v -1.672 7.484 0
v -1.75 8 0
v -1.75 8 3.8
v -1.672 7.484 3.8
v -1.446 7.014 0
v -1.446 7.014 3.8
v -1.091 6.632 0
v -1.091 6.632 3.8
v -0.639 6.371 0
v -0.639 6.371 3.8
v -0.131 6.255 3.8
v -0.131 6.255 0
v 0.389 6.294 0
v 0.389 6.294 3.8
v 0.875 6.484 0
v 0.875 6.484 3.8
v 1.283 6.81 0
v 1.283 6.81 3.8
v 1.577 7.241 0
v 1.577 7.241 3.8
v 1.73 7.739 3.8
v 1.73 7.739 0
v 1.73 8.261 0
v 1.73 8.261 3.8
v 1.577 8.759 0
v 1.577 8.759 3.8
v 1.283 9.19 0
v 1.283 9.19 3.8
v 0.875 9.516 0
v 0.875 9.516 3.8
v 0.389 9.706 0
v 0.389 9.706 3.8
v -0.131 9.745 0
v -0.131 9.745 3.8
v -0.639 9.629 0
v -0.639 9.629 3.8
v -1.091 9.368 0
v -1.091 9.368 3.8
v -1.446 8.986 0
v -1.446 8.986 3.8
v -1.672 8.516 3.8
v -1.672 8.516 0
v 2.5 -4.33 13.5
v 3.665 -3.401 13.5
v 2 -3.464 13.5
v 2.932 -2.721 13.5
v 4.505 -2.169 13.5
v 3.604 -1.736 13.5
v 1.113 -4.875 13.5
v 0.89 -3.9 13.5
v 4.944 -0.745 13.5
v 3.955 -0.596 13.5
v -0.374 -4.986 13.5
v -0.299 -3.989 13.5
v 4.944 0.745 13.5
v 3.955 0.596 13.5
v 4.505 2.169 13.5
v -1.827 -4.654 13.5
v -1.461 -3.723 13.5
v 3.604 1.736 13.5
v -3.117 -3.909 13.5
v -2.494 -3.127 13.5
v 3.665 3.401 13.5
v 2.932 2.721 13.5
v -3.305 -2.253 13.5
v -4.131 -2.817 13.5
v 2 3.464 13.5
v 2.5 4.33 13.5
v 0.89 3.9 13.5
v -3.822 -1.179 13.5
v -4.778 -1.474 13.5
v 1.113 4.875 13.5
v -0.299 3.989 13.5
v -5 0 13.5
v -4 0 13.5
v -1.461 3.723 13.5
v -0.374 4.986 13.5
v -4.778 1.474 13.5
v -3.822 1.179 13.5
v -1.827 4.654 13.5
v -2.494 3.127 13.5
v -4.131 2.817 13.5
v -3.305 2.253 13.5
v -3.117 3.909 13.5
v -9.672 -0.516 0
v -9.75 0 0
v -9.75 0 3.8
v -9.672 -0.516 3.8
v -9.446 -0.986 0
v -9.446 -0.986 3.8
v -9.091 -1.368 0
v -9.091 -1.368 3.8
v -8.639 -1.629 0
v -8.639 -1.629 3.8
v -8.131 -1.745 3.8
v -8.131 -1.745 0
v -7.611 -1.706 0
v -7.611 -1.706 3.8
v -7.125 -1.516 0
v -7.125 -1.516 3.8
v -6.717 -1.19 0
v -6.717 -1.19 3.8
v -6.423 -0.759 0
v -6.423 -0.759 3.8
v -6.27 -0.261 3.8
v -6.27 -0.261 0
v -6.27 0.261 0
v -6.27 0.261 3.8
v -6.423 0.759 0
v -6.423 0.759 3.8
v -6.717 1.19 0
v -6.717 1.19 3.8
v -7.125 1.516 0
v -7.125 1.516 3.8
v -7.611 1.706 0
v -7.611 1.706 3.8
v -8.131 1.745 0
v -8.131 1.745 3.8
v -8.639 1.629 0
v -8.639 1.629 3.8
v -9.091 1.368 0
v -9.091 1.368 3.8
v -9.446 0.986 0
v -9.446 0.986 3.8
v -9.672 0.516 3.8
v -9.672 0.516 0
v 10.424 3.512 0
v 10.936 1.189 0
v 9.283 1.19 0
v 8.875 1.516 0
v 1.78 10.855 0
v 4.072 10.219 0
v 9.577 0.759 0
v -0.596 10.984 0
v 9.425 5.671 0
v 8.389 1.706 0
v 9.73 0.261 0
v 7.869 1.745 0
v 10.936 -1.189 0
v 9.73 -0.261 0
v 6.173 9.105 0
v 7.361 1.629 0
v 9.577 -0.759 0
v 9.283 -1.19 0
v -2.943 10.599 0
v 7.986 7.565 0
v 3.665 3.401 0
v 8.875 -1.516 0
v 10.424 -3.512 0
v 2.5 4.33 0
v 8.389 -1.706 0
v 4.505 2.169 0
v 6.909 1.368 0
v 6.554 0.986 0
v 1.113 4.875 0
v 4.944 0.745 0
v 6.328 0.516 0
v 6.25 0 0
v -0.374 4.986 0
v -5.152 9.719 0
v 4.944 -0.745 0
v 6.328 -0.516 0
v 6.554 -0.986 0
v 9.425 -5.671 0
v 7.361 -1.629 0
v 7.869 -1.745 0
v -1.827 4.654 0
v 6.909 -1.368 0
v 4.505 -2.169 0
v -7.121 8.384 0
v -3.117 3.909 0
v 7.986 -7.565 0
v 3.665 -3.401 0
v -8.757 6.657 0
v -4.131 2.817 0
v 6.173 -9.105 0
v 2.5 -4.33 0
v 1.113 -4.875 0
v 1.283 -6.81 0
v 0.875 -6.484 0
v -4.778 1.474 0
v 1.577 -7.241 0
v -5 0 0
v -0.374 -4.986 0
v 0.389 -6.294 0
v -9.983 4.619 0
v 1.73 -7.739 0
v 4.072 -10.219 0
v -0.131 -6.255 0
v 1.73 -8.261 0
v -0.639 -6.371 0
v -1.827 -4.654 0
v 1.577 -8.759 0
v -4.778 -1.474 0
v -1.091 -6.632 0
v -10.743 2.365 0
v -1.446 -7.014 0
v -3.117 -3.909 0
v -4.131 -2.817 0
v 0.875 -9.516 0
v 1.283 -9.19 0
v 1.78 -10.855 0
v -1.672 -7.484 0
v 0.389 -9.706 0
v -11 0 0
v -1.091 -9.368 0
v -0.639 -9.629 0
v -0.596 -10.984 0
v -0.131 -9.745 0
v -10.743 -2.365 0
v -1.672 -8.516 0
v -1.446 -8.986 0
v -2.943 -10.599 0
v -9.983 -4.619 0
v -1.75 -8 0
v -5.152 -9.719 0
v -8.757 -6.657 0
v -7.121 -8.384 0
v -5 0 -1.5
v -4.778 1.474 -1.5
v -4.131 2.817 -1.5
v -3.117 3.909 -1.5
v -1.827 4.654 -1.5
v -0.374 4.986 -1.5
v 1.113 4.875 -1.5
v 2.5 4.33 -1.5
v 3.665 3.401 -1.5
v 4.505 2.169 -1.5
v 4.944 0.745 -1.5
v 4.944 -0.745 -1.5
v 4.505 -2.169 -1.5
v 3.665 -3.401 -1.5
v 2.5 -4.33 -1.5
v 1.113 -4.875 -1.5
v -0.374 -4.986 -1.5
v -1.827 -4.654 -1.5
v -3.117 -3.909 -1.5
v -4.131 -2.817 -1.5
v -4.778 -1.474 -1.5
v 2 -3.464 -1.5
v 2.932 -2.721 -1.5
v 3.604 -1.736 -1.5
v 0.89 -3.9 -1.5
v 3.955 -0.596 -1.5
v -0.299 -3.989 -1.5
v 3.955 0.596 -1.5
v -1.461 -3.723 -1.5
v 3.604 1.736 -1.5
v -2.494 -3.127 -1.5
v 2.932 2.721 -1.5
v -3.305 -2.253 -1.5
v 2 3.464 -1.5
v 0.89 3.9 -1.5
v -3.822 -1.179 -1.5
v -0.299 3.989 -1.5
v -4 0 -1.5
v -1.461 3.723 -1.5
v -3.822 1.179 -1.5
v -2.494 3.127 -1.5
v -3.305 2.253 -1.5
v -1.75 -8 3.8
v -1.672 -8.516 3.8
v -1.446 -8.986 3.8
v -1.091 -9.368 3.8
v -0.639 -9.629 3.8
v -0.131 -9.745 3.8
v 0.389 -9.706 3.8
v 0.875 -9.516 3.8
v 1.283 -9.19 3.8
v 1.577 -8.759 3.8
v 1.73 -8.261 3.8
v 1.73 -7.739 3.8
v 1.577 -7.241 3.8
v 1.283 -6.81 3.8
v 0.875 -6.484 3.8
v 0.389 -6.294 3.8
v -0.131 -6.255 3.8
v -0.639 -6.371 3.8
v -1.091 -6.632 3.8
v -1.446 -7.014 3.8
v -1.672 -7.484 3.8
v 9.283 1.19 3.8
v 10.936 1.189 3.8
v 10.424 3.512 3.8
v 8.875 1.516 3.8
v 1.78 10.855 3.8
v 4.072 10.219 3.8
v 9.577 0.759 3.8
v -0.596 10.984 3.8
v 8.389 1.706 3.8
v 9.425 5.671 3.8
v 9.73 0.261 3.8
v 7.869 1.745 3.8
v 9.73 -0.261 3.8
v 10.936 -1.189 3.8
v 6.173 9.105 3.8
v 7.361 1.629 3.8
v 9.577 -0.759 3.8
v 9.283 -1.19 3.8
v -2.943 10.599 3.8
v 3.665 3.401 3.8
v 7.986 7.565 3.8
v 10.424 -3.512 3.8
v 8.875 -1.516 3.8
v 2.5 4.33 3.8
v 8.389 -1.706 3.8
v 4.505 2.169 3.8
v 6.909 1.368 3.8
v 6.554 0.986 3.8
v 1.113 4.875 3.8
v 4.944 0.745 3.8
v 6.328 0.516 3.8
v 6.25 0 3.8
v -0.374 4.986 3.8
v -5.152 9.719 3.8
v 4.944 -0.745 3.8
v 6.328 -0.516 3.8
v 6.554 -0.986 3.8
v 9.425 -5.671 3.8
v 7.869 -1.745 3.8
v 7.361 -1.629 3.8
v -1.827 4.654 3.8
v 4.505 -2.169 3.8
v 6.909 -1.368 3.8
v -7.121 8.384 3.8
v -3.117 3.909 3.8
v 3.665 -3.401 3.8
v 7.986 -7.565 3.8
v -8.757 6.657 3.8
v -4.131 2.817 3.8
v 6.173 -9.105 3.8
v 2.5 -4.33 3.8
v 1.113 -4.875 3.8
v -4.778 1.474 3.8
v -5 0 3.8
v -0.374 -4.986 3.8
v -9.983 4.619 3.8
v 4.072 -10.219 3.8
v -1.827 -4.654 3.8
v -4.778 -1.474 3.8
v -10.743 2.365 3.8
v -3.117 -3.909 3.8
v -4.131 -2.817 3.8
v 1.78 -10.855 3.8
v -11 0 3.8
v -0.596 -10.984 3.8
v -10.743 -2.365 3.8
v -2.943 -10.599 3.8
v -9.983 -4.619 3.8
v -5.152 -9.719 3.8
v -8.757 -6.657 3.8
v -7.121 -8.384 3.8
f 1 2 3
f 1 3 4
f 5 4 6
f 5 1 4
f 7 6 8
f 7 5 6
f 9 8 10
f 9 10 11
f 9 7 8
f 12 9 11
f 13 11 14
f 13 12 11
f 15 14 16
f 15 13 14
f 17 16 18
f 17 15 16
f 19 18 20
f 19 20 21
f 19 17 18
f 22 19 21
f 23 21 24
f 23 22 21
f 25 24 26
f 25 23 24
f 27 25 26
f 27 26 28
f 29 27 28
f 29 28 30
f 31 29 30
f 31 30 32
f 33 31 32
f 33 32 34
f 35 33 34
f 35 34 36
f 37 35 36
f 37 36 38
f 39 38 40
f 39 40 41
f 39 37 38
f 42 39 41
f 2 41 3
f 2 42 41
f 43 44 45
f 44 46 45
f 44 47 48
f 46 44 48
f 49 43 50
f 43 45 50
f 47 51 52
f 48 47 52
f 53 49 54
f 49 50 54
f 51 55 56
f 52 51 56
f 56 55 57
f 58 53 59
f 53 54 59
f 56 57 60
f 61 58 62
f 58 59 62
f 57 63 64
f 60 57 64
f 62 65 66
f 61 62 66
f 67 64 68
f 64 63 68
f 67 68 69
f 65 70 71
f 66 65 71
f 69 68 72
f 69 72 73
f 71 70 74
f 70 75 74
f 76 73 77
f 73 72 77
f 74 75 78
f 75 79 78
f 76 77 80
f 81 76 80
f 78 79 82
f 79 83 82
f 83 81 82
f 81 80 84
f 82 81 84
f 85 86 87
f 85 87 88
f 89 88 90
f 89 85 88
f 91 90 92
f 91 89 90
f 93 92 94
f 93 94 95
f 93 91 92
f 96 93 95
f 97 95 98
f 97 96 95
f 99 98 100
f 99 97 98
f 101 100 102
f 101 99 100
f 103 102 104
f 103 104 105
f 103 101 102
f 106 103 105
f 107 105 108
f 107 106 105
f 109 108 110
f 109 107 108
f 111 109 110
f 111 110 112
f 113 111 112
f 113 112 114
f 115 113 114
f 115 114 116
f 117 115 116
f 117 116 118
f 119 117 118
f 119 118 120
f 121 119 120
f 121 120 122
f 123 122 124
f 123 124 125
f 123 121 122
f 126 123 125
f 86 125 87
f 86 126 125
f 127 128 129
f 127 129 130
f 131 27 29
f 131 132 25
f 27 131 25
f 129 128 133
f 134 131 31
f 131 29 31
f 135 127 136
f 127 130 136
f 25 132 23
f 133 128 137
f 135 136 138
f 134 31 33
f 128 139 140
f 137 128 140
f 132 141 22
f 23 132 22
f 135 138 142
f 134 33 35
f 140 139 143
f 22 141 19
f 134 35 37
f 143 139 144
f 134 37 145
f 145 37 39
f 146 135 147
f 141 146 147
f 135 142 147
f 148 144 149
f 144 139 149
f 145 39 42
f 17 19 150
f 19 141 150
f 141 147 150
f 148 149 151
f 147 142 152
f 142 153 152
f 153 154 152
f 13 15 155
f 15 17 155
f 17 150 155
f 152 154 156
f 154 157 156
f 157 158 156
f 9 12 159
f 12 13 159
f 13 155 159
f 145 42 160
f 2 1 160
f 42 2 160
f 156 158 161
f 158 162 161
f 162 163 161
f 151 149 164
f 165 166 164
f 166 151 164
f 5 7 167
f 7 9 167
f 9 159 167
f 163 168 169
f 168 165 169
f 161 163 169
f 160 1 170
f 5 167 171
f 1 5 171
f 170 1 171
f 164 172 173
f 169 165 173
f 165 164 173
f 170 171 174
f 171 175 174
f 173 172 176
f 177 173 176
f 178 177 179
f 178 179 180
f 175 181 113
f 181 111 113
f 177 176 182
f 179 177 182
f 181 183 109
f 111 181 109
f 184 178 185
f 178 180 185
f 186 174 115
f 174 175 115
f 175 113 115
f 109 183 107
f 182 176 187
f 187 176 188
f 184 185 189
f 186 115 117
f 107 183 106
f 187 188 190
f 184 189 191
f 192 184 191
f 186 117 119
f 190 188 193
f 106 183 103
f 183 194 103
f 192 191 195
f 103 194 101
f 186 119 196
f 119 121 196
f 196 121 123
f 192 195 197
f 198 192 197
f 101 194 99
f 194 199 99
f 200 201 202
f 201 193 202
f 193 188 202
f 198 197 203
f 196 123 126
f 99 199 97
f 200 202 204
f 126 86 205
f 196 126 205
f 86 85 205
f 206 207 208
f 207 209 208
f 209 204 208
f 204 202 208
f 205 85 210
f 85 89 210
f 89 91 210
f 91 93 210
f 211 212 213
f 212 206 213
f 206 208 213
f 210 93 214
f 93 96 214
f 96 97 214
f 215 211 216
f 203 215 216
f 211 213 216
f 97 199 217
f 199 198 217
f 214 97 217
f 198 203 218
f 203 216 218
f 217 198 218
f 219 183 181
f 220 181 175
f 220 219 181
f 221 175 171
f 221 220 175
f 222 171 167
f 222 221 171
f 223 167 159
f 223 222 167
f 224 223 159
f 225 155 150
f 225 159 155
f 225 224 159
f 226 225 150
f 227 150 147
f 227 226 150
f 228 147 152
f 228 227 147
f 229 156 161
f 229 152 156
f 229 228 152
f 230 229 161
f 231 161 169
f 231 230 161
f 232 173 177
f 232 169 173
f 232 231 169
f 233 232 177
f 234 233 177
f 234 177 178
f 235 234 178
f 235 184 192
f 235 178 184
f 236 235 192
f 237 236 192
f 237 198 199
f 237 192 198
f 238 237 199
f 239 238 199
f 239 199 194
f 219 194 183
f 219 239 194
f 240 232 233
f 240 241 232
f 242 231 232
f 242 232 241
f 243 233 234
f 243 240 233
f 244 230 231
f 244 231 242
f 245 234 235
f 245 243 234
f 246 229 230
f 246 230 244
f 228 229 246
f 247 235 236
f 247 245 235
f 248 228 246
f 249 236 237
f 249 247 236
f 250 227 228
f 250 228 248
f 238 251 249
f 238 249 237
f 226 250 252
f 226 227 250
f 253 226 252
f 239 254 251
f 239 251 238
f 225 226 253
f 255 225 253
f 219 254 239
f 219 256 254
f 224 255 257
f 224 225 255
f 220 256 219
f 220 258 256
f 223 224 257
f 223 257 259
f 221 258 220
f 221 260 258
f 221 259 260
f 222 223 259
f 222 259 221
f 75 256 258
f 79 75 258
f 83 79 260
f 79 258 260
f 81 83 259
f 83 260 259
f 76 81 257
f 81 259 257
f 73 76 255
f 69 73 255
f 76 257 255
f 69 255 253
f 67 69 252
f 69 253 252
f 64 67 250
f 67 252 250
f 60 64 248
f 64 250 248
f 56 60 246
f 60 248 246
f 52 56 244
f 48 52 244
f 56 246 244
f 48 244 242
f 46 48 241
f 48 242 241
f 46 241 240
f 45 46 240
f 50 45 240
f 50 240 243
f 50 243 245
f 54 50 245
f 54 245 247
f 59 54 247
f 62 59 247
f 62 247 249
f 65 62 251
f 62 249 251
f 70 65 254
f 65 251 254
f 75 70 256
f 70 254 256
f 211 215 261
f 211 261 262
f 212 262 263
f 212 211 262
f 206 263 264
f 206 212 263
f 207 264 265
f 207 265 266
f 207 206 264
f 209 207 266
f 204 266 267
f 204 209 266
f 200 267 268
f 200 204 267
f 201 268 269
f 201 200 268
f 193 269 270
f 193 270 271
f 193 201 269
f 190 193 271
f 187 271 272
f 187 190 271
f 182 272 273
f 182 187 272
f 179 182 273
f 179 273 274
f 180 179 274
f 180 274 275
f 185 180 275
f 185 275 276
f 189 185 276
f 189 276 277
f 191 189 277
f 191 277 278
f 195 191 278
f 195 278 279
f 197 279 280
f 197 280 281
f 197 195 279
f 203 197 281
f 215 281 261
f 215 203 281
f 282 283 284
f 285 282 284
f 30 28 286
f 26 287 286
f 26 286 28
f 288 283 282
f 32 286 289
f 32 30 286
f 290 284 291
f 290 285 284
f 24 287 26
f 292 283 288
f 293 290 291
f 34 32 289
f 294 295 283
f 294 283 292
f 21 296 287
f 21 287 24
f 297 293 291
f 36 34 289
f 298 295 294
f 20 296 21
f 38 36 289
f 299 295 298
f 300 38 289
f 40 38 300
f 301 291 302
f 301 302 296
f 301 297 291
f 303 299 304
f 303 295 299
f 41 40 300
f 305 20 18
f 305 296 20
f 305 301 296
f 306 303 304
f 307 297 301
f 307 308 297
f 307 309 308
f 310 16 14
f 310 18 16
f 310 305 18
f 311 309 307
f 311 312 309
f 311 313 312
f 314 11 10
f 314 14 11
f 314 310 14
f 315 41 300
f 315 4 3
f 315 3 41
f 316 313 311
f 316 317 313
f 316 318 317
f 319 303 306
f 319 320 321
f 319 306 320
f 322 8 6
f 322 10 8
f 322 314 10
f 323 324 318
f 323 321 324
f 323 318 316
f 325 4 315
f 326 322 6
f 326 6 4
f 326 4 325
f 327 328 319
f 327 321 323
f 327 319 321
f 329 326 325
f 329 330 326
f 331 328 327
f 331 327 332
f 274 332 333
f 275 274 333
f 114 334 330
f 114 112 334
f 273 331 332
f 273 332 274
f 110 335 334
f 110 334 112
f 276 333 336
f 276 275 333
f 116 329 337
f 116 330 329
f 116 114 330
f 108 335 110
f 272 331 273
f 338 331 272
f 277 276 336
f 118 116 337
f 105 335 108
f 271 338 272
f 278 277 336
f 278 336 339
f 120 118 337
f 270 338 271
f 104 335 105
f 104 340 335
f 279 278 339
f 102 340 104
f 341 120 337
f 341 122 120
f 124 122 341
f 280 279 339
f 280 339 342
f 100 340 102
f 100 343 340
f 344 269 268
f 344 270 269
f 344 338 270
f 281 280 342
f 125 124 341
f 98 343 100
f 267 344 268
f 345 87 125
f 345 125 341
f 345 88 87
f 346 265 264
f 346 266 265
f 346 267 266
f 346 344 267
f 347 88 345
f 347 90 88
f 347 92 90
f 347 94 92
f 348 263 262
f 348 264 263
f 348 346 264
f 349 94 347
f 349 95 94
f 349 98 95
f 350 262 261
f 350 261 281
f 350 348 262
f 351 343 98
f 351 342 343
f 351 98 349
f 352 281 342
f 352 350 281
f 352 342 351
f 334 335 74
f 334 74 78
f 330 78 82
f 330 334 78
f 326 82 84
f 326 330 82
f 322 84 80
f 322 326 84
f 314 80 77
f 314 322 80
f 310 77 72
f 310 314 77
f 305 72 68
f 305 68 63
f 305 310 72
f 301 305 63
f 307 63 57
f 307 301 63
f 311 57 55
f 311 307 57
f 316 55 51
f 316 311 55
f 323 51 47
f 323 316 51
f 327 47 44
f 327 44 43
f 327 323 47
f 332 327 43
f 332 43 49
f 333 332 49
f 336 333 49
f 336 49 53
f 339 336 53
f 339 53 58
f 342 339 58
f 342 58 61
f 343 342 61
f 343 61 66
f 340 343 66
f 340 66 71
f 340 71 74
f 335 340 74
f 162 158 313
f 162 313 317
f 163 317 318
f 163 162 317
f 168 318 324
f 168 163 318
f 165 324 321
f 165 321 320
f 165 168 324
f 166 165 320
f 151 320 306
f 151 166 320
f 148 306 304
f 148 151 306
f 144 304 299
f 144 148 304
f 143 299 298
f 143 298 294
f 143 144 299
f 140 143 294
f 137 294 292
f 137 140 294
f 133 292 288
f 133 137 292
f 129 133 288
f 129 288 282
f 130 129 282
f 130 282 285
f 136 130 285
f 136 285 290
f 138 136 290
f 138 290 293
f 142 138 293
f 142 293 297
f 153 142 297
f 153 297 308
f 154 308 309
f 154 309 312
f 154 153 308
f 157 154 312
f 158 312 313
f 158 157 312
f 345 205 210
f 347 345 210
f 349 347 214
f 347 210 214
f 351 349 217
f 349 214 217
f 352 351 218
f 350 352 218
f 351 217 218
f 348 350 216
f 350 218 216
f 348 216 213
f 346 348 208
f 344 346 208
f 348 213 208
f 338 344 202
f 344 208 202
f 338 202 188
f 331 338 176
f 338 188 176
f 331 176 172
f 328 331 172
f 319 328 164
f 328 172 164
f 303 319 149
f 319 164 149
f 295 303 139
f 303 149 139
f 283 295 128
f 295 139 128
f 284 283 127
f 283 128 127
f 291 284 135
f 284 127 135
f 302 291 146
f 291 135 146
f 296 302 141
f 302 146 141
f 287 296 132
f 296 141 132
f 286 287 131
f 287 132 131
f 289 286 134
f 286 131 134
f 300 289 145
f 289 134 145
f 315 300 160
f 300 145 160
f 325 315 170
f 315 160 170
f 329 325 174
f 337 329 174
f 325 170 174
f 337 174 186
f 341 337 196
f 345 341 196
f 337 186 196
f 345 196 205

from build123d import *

# Parameters (mm, degrees)
SKETCH_1_R      = 11
SKETCH_1_R_2    = 5
SKETCH_1_R_3    = 1.75
EXTRUDE_1_DEPTH = 3.8
EXTRUDE_START   = 1.5
SKETCH_2_R      = 5
SKETCH_2_R_2    = 4
EXTRUDE_2_DEPTH = 15


with BuildPart() as part:
    # 草图1 → 凸台-拉伸1 (new body)
    with BuildSketch(Plane.XY):
        with Locations(Location((0, 0, 0), (0, 0, 180))):
            Circle(SKETCH_1_R)
        with Locations(Location((0, 0, 0), (0, 0, 180))):
            Circle(SKETCH_1_R_2, mode=Mode.SUBTRACT)
        with Locations(Location((-8, 0, 0), (0, 0, 180))):
            Circle(SKETCH_1_R_3, mode=Mode.SUBTRACT)
        with Locations(Location((0, 8, 0), (0, 0, 180))):
            Circle(SKETCH_1_R_3, mode=Mode.SUBTRACT)
        with Locations(Location((8, 0, 0), (0, 0, 180))):
            Circle(SKETCH_1_R_3, mode=Mode.SUBTRACT)
        with Locations(Location((0, -8, 0), (0, 0, 180))):
            Circle(SKETCH_1_R_3, mode=Mode.SUBTRACT)
    extrude(amount=EXTRUDE_1_DEPTH)

    # 草图2 → 凸台-拉伸2 (add)
    with BuildSketch(Plane(origin=(0, 0, 0), x_dir=(-1, 0, 0), z_dir=(0, 0, -1)).offset(EXTRUDE_START)):
        Circle(SKETCH_2_R)
        Circle(SKETCH_2_R_2, mode=Mode.SUBTRACT)
    extrude(amount=-EXTRUDE_2_DEPTH)


solid = part.part
